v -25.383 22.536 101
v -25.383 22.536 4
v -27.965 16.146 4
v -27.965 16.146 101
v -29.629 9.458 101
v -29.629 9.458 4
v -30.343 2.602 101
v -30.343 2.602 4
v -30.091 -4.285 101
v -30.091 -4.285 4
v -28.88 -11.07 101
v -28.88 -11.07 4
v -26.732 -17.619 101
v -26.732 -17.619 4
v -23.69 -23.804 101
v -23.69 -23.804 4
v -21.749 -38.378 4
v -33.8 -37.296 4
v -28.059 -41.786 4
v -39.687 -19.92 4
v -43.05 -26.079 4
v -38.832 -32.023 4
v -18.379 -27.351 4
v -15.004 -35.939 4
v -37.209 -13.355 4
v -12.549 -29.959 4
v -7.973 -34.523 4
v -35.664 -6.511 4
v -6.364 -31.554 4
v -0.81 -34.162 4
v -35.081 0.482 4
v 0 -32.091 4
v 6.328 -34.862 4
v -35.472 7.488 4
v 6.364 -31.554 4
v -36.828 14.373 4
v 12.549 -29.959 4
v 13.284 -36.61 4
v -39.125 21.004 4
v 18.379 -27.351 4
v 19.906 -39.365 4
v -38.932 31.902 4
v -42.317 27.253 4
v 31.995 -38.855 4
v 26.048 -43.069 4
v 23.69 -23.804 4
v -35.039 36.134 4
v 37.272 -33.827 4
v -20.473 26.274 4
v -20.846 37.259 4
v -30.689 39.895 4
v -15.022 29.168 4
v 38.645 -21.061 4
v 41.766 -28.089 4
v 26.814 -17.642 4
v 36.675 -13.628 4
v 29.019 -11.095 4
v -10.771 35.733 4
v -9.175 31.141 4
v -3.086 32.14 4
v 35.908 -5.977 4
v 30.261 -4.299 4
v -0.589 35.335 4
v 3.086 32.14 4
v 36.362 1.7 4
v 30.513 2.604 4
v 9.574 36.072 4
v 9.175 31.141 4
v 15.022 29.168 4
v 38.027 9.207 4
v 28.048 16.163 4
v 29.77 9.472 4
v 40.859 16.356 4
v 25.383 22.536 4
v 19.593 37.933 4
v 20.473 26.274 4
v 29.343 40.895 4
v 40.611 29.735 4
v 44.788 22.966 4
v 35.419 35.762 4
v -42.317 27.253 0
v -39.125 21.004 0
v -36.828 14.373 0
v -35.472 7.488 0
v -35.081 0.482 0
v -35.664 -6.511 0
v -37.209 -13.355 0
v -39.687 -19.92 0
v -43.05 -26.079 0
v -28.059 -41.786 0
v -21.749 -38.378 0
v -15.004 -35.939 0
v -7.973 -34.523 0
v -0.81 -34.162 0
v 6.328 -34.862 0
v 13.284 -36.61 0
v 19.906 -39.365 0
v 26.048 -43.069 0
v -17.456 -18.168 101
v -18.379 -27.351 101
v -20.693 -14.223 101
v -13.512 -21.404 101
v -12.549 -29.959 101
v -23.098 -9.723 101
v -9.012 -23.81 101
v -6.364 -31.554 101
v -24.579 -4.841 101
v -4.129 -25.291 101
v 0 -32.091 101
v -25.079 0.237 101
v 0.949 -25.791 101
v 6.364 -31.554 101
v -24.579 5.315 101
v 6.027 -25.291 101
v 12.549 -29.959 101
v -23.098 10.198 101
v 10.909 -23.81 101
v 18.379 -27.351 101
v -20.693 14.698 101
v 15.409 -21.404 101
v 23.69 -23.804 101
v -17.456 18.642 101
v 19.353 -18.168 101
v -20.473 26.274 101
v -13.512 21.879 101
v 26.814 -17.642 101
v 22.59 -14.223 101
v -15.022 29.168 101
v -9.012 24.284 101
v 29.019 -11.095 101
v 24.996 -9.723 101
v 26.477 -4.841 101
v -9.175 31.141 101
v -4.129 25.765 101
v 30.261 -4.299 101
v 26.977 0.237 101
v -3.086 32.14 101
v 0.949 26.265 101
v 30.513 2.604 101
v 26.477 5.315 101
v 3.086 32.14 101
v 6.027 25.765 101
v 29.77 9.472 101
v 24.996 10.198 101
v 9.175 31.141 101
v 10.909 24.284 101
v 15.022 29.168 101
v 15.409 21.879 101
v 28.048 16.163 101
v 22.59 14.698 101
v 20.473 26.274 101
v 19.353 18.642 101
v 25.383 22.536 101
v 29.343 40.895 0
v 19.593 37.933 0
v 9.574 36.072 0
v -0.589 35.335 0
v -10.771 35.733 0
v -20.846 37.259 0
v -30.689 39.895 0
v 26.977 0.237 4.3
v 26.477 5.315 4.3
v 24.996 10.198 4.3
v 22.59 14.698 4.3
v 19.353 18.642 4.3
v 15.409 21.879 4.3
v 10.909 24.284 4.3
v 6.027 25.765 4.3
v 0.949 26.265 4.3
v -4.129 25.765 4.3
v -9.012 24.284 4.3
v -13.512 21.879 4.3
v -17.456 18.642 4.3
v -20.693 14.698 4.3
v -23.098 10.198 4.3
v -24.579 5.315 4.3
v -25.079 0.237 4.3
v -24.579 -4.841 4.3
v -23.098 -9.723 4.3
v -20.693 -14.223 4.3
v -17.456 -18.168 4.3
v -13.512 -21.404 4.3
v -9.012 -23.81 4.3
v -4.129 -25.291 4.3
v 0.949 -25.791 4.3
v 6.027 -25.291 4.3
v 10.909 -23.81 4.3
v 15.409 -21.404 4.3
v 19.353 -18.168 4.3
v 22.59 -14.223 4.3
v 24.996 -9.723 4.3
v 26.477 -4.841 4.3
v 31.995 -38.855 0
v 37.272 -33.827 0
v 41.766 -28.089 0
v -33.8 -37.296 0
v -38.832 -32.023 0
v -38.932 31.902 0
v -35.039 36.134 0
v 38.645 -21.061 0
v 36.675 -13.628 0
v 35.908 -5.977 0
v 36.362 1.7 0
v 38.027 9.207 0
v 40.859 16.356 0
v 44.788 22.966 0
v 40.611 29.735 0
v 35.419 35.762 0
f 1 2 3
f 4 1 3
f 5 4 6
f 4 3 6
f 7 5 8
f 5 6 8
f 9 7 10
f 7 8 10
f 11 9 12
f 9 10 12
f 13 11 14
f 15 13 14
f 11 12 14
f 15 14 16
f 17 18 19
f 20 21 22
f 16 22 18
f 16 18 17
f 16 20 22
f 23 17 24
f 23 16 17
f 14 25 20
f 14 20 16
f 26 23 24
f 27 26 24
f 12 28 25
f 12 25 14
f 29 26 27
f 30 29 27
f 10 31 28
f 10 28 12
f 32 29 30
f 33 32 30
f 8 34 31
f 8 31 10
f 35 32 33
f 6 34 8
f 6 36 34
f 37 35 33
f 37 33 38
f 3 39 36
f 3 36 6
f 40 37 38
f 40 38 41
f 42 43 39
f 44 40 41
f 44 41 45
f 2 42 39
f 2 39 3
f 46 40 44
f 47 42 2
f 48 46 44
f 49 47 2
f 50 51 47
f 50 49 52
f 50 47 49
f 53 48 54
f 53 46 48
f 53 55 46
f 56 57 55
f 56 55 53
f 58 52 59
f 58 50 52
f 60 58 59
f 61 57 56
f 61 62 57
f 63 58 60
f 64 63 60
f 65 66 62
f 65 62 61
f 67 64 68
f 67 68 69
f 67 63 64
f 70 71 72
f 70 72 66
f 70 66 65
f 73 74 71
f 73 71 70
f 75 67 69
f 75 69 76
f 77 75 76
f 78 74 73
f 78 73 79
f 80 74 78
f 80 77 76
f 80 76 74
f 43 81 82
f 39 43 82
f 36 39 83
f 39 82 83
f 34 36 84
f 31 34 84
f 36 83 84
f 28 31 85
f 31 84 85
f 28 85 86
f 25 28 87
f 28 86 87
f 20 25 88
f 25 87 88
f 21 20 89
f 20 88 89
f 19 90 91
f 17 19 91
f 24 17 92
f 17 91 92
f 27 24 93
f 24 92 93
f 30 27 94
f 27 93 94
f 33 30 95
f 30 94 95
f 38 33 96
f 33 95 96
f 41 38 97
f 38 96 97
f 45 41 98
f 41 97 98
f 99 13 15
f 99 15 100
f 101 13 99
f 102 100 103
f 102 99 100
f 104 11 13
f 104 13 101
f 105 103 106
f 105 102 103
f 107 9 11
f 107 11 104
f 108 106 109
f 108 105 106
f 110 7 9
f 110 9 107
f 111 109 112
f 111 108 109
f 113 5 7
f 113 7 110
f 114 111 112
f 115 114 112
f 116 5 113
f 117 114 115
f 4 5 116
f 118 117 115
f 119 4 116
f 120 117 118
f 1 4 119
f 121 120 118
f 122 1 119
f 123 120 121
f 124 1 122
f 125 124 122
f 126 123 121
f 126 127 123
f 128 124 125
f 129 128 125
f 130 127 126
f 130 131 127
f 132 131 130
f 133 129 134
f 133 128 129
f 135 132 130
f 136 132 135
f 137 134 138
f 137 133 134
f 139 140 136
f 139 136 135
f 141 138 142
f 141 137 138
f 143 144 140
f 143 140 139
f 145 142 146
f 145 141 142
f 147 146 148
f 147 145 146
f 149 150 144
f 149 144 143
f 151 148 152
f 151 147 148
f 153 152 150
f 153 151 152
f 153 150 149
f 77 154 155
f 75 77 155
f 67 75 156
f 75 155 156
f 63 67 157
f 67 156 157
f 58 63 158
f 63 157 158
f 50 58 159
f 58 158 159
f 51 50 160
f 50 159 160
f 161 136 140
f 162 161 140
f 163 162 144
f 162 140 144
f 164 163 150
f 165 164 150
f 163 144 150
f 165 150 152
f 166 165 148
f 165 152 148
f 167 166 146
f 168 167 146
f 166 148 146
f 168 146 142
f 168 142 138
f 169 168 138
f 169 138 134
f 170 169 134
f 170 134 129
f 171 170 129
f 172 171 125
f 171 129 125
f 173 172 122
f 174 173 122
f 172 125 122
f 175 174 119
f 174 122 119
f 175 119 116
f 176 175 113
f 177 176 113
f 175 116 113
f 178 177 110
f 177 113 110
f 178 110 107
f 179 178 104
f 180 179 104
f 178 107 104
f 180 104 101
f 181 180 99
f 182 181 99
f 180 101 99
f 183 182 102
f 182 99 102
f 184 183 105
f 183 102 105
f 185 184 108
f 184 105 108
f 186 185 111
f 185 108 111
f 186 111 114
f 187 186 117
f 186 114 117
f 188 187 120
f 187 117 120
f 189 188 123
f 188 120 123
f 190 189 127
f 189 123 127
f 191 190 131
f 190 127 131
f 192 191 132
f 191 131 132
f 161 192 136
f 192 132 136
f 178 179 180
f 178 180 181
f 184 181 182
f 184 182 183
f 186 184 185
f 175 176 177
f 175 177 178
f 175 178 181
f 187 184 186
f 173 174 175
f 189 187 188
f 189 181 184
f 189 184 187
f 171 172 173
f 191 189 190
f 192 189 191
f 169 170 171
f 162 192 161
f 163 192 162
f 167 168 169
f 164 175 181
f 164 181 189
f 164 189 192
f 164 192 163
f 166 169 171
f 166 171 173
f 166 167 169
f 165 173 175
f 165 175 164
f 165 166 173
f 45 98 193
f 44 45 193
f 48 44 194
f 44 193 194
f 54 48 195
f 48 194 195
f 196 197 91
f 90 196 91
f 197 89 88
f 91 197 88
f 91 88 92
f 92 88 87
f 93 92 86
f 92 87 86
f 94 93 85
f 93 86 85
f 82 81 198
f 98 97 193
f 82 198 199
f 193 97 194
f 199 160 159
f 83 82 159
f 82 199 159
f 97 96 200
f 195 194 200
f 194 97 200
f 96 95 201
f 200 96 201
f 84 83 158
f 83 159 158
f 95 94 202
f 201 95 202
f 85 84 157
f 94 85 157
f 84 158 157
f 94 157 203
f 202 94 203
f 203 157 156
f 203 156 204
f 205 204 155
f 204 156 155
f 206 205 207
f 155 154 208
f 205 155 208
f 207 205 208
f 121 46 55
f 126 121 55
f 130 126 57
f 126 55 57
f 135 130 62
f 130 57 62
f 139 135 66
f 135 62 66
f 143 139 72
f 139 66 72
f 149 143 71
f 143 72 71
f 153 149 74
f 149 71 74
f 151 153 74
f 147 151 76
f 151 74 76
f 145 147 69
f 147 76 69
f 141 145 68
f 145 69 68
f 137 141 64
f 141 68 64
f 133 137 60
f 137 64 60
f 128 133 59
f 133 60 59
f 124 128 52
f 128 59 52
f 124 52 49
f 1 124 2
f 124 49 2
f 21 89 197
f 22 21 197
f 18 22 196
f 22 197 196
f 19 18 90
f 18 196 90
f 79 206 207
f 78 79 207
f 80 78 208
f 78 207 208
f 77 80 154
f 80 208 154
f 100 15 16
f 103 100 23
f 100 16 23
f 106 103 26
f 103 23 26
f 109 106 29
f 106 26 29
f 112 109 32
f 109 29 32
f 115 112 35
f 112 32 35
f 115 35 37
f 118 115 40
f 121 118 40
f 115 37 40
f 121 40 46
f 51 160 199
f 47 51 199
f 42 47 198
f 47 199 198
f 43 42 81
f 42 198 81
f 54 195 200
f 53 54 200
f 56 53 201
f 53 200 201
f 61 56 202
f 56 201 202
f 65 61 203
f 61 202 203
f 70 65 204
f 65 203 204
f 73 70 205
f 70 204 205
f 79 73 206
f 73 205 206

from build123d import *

# Parameters (mm, degrees)
F1_DEPTH = 101
F2_R     = 26.0281777089
F3_DEPTH = 96.7
F5_DEPTH = 4


with BuildPart() as f1:
    # F0 (on Top) → F1 (new body)
    with BuildSketch(Plane.XY):
        with BuildLine():
            ThreePointArc((23.6903417145, -23.8037893118), (30.5111124696, -0.8521403709), (25.3826190605, 22.5358834478))
            ThreePointArc((25.3826190605, 22.5358834478), (0, 32.2655875029), (-25.3826190605, 22.5358834478))
            ThreePointArc((-25.3826190605, 22.5358834478), (-30.337839801, -0.8458126307), (-23.6903417145, -23.8037893118))
            ThreePointArc((-23.6903417145, -23.8037893118), (0, -32.0909383549), (23.6903417145, -23.8037893118))
        make_face()
    extrude(amount=F1_DEPTH)

    # F2 (on face) → F3 (cut)
    with BuildSketch(Plane.XY.offset(101)):
        with Locations((0.9487959906, 0.2371987939)):
            Circle(F2_R)
    extrude(amount=-F3_DEPTH, mode=Mode.SUBTRACT)

    # F4 (on Top) → F5 (join)
    with BuildSketch(Plane.XY):
        with BuildLine():
            ThreePointArc((41.7664500982, -28.0889039008), (35.9824056468, -2.129560913), (44.7880711781, 22.9663135113))
            ThreePointArc((44.7880711781, 22.9663135113), (38.1340229318, 32.8514713703), (29.3426477198, 40.895377501))
            ThreePointArc((29.3426477198, 40.895377501), (-0.5888166123, 35.3352467721), (-30.6889163173, 39.8950284049))
            ThreePointArc((-30.6889163173, 39.8950284049), (-37.0460992048, 34.0735881566), (-42.3167543976, 27.252801203))
            ThreePointArc((-42.3167543976, 27.252801203), (-35.0812809888, 0.4822388969), (-43.0498754281, -26.0793232617))
            ThreePointArc((-43.0498754281, -26.0793232617), (-36.4116539714, -34.750745765), (-28.0593730131, -41.7862951489))
            ThreePointArc((-28.0593730131, -41.7862951489), (-0.8099307183, -34.1616163684), (26.0475538255, -43.0691051203))
            ThreePointArc((26.0475538255, -43.0691051203), (34.7244350449, -36.4367463829), (41.7664500982, -28.0889039008))
        make_face()
    extrude(amount=F5_DEPTH)


solid = f1.part
